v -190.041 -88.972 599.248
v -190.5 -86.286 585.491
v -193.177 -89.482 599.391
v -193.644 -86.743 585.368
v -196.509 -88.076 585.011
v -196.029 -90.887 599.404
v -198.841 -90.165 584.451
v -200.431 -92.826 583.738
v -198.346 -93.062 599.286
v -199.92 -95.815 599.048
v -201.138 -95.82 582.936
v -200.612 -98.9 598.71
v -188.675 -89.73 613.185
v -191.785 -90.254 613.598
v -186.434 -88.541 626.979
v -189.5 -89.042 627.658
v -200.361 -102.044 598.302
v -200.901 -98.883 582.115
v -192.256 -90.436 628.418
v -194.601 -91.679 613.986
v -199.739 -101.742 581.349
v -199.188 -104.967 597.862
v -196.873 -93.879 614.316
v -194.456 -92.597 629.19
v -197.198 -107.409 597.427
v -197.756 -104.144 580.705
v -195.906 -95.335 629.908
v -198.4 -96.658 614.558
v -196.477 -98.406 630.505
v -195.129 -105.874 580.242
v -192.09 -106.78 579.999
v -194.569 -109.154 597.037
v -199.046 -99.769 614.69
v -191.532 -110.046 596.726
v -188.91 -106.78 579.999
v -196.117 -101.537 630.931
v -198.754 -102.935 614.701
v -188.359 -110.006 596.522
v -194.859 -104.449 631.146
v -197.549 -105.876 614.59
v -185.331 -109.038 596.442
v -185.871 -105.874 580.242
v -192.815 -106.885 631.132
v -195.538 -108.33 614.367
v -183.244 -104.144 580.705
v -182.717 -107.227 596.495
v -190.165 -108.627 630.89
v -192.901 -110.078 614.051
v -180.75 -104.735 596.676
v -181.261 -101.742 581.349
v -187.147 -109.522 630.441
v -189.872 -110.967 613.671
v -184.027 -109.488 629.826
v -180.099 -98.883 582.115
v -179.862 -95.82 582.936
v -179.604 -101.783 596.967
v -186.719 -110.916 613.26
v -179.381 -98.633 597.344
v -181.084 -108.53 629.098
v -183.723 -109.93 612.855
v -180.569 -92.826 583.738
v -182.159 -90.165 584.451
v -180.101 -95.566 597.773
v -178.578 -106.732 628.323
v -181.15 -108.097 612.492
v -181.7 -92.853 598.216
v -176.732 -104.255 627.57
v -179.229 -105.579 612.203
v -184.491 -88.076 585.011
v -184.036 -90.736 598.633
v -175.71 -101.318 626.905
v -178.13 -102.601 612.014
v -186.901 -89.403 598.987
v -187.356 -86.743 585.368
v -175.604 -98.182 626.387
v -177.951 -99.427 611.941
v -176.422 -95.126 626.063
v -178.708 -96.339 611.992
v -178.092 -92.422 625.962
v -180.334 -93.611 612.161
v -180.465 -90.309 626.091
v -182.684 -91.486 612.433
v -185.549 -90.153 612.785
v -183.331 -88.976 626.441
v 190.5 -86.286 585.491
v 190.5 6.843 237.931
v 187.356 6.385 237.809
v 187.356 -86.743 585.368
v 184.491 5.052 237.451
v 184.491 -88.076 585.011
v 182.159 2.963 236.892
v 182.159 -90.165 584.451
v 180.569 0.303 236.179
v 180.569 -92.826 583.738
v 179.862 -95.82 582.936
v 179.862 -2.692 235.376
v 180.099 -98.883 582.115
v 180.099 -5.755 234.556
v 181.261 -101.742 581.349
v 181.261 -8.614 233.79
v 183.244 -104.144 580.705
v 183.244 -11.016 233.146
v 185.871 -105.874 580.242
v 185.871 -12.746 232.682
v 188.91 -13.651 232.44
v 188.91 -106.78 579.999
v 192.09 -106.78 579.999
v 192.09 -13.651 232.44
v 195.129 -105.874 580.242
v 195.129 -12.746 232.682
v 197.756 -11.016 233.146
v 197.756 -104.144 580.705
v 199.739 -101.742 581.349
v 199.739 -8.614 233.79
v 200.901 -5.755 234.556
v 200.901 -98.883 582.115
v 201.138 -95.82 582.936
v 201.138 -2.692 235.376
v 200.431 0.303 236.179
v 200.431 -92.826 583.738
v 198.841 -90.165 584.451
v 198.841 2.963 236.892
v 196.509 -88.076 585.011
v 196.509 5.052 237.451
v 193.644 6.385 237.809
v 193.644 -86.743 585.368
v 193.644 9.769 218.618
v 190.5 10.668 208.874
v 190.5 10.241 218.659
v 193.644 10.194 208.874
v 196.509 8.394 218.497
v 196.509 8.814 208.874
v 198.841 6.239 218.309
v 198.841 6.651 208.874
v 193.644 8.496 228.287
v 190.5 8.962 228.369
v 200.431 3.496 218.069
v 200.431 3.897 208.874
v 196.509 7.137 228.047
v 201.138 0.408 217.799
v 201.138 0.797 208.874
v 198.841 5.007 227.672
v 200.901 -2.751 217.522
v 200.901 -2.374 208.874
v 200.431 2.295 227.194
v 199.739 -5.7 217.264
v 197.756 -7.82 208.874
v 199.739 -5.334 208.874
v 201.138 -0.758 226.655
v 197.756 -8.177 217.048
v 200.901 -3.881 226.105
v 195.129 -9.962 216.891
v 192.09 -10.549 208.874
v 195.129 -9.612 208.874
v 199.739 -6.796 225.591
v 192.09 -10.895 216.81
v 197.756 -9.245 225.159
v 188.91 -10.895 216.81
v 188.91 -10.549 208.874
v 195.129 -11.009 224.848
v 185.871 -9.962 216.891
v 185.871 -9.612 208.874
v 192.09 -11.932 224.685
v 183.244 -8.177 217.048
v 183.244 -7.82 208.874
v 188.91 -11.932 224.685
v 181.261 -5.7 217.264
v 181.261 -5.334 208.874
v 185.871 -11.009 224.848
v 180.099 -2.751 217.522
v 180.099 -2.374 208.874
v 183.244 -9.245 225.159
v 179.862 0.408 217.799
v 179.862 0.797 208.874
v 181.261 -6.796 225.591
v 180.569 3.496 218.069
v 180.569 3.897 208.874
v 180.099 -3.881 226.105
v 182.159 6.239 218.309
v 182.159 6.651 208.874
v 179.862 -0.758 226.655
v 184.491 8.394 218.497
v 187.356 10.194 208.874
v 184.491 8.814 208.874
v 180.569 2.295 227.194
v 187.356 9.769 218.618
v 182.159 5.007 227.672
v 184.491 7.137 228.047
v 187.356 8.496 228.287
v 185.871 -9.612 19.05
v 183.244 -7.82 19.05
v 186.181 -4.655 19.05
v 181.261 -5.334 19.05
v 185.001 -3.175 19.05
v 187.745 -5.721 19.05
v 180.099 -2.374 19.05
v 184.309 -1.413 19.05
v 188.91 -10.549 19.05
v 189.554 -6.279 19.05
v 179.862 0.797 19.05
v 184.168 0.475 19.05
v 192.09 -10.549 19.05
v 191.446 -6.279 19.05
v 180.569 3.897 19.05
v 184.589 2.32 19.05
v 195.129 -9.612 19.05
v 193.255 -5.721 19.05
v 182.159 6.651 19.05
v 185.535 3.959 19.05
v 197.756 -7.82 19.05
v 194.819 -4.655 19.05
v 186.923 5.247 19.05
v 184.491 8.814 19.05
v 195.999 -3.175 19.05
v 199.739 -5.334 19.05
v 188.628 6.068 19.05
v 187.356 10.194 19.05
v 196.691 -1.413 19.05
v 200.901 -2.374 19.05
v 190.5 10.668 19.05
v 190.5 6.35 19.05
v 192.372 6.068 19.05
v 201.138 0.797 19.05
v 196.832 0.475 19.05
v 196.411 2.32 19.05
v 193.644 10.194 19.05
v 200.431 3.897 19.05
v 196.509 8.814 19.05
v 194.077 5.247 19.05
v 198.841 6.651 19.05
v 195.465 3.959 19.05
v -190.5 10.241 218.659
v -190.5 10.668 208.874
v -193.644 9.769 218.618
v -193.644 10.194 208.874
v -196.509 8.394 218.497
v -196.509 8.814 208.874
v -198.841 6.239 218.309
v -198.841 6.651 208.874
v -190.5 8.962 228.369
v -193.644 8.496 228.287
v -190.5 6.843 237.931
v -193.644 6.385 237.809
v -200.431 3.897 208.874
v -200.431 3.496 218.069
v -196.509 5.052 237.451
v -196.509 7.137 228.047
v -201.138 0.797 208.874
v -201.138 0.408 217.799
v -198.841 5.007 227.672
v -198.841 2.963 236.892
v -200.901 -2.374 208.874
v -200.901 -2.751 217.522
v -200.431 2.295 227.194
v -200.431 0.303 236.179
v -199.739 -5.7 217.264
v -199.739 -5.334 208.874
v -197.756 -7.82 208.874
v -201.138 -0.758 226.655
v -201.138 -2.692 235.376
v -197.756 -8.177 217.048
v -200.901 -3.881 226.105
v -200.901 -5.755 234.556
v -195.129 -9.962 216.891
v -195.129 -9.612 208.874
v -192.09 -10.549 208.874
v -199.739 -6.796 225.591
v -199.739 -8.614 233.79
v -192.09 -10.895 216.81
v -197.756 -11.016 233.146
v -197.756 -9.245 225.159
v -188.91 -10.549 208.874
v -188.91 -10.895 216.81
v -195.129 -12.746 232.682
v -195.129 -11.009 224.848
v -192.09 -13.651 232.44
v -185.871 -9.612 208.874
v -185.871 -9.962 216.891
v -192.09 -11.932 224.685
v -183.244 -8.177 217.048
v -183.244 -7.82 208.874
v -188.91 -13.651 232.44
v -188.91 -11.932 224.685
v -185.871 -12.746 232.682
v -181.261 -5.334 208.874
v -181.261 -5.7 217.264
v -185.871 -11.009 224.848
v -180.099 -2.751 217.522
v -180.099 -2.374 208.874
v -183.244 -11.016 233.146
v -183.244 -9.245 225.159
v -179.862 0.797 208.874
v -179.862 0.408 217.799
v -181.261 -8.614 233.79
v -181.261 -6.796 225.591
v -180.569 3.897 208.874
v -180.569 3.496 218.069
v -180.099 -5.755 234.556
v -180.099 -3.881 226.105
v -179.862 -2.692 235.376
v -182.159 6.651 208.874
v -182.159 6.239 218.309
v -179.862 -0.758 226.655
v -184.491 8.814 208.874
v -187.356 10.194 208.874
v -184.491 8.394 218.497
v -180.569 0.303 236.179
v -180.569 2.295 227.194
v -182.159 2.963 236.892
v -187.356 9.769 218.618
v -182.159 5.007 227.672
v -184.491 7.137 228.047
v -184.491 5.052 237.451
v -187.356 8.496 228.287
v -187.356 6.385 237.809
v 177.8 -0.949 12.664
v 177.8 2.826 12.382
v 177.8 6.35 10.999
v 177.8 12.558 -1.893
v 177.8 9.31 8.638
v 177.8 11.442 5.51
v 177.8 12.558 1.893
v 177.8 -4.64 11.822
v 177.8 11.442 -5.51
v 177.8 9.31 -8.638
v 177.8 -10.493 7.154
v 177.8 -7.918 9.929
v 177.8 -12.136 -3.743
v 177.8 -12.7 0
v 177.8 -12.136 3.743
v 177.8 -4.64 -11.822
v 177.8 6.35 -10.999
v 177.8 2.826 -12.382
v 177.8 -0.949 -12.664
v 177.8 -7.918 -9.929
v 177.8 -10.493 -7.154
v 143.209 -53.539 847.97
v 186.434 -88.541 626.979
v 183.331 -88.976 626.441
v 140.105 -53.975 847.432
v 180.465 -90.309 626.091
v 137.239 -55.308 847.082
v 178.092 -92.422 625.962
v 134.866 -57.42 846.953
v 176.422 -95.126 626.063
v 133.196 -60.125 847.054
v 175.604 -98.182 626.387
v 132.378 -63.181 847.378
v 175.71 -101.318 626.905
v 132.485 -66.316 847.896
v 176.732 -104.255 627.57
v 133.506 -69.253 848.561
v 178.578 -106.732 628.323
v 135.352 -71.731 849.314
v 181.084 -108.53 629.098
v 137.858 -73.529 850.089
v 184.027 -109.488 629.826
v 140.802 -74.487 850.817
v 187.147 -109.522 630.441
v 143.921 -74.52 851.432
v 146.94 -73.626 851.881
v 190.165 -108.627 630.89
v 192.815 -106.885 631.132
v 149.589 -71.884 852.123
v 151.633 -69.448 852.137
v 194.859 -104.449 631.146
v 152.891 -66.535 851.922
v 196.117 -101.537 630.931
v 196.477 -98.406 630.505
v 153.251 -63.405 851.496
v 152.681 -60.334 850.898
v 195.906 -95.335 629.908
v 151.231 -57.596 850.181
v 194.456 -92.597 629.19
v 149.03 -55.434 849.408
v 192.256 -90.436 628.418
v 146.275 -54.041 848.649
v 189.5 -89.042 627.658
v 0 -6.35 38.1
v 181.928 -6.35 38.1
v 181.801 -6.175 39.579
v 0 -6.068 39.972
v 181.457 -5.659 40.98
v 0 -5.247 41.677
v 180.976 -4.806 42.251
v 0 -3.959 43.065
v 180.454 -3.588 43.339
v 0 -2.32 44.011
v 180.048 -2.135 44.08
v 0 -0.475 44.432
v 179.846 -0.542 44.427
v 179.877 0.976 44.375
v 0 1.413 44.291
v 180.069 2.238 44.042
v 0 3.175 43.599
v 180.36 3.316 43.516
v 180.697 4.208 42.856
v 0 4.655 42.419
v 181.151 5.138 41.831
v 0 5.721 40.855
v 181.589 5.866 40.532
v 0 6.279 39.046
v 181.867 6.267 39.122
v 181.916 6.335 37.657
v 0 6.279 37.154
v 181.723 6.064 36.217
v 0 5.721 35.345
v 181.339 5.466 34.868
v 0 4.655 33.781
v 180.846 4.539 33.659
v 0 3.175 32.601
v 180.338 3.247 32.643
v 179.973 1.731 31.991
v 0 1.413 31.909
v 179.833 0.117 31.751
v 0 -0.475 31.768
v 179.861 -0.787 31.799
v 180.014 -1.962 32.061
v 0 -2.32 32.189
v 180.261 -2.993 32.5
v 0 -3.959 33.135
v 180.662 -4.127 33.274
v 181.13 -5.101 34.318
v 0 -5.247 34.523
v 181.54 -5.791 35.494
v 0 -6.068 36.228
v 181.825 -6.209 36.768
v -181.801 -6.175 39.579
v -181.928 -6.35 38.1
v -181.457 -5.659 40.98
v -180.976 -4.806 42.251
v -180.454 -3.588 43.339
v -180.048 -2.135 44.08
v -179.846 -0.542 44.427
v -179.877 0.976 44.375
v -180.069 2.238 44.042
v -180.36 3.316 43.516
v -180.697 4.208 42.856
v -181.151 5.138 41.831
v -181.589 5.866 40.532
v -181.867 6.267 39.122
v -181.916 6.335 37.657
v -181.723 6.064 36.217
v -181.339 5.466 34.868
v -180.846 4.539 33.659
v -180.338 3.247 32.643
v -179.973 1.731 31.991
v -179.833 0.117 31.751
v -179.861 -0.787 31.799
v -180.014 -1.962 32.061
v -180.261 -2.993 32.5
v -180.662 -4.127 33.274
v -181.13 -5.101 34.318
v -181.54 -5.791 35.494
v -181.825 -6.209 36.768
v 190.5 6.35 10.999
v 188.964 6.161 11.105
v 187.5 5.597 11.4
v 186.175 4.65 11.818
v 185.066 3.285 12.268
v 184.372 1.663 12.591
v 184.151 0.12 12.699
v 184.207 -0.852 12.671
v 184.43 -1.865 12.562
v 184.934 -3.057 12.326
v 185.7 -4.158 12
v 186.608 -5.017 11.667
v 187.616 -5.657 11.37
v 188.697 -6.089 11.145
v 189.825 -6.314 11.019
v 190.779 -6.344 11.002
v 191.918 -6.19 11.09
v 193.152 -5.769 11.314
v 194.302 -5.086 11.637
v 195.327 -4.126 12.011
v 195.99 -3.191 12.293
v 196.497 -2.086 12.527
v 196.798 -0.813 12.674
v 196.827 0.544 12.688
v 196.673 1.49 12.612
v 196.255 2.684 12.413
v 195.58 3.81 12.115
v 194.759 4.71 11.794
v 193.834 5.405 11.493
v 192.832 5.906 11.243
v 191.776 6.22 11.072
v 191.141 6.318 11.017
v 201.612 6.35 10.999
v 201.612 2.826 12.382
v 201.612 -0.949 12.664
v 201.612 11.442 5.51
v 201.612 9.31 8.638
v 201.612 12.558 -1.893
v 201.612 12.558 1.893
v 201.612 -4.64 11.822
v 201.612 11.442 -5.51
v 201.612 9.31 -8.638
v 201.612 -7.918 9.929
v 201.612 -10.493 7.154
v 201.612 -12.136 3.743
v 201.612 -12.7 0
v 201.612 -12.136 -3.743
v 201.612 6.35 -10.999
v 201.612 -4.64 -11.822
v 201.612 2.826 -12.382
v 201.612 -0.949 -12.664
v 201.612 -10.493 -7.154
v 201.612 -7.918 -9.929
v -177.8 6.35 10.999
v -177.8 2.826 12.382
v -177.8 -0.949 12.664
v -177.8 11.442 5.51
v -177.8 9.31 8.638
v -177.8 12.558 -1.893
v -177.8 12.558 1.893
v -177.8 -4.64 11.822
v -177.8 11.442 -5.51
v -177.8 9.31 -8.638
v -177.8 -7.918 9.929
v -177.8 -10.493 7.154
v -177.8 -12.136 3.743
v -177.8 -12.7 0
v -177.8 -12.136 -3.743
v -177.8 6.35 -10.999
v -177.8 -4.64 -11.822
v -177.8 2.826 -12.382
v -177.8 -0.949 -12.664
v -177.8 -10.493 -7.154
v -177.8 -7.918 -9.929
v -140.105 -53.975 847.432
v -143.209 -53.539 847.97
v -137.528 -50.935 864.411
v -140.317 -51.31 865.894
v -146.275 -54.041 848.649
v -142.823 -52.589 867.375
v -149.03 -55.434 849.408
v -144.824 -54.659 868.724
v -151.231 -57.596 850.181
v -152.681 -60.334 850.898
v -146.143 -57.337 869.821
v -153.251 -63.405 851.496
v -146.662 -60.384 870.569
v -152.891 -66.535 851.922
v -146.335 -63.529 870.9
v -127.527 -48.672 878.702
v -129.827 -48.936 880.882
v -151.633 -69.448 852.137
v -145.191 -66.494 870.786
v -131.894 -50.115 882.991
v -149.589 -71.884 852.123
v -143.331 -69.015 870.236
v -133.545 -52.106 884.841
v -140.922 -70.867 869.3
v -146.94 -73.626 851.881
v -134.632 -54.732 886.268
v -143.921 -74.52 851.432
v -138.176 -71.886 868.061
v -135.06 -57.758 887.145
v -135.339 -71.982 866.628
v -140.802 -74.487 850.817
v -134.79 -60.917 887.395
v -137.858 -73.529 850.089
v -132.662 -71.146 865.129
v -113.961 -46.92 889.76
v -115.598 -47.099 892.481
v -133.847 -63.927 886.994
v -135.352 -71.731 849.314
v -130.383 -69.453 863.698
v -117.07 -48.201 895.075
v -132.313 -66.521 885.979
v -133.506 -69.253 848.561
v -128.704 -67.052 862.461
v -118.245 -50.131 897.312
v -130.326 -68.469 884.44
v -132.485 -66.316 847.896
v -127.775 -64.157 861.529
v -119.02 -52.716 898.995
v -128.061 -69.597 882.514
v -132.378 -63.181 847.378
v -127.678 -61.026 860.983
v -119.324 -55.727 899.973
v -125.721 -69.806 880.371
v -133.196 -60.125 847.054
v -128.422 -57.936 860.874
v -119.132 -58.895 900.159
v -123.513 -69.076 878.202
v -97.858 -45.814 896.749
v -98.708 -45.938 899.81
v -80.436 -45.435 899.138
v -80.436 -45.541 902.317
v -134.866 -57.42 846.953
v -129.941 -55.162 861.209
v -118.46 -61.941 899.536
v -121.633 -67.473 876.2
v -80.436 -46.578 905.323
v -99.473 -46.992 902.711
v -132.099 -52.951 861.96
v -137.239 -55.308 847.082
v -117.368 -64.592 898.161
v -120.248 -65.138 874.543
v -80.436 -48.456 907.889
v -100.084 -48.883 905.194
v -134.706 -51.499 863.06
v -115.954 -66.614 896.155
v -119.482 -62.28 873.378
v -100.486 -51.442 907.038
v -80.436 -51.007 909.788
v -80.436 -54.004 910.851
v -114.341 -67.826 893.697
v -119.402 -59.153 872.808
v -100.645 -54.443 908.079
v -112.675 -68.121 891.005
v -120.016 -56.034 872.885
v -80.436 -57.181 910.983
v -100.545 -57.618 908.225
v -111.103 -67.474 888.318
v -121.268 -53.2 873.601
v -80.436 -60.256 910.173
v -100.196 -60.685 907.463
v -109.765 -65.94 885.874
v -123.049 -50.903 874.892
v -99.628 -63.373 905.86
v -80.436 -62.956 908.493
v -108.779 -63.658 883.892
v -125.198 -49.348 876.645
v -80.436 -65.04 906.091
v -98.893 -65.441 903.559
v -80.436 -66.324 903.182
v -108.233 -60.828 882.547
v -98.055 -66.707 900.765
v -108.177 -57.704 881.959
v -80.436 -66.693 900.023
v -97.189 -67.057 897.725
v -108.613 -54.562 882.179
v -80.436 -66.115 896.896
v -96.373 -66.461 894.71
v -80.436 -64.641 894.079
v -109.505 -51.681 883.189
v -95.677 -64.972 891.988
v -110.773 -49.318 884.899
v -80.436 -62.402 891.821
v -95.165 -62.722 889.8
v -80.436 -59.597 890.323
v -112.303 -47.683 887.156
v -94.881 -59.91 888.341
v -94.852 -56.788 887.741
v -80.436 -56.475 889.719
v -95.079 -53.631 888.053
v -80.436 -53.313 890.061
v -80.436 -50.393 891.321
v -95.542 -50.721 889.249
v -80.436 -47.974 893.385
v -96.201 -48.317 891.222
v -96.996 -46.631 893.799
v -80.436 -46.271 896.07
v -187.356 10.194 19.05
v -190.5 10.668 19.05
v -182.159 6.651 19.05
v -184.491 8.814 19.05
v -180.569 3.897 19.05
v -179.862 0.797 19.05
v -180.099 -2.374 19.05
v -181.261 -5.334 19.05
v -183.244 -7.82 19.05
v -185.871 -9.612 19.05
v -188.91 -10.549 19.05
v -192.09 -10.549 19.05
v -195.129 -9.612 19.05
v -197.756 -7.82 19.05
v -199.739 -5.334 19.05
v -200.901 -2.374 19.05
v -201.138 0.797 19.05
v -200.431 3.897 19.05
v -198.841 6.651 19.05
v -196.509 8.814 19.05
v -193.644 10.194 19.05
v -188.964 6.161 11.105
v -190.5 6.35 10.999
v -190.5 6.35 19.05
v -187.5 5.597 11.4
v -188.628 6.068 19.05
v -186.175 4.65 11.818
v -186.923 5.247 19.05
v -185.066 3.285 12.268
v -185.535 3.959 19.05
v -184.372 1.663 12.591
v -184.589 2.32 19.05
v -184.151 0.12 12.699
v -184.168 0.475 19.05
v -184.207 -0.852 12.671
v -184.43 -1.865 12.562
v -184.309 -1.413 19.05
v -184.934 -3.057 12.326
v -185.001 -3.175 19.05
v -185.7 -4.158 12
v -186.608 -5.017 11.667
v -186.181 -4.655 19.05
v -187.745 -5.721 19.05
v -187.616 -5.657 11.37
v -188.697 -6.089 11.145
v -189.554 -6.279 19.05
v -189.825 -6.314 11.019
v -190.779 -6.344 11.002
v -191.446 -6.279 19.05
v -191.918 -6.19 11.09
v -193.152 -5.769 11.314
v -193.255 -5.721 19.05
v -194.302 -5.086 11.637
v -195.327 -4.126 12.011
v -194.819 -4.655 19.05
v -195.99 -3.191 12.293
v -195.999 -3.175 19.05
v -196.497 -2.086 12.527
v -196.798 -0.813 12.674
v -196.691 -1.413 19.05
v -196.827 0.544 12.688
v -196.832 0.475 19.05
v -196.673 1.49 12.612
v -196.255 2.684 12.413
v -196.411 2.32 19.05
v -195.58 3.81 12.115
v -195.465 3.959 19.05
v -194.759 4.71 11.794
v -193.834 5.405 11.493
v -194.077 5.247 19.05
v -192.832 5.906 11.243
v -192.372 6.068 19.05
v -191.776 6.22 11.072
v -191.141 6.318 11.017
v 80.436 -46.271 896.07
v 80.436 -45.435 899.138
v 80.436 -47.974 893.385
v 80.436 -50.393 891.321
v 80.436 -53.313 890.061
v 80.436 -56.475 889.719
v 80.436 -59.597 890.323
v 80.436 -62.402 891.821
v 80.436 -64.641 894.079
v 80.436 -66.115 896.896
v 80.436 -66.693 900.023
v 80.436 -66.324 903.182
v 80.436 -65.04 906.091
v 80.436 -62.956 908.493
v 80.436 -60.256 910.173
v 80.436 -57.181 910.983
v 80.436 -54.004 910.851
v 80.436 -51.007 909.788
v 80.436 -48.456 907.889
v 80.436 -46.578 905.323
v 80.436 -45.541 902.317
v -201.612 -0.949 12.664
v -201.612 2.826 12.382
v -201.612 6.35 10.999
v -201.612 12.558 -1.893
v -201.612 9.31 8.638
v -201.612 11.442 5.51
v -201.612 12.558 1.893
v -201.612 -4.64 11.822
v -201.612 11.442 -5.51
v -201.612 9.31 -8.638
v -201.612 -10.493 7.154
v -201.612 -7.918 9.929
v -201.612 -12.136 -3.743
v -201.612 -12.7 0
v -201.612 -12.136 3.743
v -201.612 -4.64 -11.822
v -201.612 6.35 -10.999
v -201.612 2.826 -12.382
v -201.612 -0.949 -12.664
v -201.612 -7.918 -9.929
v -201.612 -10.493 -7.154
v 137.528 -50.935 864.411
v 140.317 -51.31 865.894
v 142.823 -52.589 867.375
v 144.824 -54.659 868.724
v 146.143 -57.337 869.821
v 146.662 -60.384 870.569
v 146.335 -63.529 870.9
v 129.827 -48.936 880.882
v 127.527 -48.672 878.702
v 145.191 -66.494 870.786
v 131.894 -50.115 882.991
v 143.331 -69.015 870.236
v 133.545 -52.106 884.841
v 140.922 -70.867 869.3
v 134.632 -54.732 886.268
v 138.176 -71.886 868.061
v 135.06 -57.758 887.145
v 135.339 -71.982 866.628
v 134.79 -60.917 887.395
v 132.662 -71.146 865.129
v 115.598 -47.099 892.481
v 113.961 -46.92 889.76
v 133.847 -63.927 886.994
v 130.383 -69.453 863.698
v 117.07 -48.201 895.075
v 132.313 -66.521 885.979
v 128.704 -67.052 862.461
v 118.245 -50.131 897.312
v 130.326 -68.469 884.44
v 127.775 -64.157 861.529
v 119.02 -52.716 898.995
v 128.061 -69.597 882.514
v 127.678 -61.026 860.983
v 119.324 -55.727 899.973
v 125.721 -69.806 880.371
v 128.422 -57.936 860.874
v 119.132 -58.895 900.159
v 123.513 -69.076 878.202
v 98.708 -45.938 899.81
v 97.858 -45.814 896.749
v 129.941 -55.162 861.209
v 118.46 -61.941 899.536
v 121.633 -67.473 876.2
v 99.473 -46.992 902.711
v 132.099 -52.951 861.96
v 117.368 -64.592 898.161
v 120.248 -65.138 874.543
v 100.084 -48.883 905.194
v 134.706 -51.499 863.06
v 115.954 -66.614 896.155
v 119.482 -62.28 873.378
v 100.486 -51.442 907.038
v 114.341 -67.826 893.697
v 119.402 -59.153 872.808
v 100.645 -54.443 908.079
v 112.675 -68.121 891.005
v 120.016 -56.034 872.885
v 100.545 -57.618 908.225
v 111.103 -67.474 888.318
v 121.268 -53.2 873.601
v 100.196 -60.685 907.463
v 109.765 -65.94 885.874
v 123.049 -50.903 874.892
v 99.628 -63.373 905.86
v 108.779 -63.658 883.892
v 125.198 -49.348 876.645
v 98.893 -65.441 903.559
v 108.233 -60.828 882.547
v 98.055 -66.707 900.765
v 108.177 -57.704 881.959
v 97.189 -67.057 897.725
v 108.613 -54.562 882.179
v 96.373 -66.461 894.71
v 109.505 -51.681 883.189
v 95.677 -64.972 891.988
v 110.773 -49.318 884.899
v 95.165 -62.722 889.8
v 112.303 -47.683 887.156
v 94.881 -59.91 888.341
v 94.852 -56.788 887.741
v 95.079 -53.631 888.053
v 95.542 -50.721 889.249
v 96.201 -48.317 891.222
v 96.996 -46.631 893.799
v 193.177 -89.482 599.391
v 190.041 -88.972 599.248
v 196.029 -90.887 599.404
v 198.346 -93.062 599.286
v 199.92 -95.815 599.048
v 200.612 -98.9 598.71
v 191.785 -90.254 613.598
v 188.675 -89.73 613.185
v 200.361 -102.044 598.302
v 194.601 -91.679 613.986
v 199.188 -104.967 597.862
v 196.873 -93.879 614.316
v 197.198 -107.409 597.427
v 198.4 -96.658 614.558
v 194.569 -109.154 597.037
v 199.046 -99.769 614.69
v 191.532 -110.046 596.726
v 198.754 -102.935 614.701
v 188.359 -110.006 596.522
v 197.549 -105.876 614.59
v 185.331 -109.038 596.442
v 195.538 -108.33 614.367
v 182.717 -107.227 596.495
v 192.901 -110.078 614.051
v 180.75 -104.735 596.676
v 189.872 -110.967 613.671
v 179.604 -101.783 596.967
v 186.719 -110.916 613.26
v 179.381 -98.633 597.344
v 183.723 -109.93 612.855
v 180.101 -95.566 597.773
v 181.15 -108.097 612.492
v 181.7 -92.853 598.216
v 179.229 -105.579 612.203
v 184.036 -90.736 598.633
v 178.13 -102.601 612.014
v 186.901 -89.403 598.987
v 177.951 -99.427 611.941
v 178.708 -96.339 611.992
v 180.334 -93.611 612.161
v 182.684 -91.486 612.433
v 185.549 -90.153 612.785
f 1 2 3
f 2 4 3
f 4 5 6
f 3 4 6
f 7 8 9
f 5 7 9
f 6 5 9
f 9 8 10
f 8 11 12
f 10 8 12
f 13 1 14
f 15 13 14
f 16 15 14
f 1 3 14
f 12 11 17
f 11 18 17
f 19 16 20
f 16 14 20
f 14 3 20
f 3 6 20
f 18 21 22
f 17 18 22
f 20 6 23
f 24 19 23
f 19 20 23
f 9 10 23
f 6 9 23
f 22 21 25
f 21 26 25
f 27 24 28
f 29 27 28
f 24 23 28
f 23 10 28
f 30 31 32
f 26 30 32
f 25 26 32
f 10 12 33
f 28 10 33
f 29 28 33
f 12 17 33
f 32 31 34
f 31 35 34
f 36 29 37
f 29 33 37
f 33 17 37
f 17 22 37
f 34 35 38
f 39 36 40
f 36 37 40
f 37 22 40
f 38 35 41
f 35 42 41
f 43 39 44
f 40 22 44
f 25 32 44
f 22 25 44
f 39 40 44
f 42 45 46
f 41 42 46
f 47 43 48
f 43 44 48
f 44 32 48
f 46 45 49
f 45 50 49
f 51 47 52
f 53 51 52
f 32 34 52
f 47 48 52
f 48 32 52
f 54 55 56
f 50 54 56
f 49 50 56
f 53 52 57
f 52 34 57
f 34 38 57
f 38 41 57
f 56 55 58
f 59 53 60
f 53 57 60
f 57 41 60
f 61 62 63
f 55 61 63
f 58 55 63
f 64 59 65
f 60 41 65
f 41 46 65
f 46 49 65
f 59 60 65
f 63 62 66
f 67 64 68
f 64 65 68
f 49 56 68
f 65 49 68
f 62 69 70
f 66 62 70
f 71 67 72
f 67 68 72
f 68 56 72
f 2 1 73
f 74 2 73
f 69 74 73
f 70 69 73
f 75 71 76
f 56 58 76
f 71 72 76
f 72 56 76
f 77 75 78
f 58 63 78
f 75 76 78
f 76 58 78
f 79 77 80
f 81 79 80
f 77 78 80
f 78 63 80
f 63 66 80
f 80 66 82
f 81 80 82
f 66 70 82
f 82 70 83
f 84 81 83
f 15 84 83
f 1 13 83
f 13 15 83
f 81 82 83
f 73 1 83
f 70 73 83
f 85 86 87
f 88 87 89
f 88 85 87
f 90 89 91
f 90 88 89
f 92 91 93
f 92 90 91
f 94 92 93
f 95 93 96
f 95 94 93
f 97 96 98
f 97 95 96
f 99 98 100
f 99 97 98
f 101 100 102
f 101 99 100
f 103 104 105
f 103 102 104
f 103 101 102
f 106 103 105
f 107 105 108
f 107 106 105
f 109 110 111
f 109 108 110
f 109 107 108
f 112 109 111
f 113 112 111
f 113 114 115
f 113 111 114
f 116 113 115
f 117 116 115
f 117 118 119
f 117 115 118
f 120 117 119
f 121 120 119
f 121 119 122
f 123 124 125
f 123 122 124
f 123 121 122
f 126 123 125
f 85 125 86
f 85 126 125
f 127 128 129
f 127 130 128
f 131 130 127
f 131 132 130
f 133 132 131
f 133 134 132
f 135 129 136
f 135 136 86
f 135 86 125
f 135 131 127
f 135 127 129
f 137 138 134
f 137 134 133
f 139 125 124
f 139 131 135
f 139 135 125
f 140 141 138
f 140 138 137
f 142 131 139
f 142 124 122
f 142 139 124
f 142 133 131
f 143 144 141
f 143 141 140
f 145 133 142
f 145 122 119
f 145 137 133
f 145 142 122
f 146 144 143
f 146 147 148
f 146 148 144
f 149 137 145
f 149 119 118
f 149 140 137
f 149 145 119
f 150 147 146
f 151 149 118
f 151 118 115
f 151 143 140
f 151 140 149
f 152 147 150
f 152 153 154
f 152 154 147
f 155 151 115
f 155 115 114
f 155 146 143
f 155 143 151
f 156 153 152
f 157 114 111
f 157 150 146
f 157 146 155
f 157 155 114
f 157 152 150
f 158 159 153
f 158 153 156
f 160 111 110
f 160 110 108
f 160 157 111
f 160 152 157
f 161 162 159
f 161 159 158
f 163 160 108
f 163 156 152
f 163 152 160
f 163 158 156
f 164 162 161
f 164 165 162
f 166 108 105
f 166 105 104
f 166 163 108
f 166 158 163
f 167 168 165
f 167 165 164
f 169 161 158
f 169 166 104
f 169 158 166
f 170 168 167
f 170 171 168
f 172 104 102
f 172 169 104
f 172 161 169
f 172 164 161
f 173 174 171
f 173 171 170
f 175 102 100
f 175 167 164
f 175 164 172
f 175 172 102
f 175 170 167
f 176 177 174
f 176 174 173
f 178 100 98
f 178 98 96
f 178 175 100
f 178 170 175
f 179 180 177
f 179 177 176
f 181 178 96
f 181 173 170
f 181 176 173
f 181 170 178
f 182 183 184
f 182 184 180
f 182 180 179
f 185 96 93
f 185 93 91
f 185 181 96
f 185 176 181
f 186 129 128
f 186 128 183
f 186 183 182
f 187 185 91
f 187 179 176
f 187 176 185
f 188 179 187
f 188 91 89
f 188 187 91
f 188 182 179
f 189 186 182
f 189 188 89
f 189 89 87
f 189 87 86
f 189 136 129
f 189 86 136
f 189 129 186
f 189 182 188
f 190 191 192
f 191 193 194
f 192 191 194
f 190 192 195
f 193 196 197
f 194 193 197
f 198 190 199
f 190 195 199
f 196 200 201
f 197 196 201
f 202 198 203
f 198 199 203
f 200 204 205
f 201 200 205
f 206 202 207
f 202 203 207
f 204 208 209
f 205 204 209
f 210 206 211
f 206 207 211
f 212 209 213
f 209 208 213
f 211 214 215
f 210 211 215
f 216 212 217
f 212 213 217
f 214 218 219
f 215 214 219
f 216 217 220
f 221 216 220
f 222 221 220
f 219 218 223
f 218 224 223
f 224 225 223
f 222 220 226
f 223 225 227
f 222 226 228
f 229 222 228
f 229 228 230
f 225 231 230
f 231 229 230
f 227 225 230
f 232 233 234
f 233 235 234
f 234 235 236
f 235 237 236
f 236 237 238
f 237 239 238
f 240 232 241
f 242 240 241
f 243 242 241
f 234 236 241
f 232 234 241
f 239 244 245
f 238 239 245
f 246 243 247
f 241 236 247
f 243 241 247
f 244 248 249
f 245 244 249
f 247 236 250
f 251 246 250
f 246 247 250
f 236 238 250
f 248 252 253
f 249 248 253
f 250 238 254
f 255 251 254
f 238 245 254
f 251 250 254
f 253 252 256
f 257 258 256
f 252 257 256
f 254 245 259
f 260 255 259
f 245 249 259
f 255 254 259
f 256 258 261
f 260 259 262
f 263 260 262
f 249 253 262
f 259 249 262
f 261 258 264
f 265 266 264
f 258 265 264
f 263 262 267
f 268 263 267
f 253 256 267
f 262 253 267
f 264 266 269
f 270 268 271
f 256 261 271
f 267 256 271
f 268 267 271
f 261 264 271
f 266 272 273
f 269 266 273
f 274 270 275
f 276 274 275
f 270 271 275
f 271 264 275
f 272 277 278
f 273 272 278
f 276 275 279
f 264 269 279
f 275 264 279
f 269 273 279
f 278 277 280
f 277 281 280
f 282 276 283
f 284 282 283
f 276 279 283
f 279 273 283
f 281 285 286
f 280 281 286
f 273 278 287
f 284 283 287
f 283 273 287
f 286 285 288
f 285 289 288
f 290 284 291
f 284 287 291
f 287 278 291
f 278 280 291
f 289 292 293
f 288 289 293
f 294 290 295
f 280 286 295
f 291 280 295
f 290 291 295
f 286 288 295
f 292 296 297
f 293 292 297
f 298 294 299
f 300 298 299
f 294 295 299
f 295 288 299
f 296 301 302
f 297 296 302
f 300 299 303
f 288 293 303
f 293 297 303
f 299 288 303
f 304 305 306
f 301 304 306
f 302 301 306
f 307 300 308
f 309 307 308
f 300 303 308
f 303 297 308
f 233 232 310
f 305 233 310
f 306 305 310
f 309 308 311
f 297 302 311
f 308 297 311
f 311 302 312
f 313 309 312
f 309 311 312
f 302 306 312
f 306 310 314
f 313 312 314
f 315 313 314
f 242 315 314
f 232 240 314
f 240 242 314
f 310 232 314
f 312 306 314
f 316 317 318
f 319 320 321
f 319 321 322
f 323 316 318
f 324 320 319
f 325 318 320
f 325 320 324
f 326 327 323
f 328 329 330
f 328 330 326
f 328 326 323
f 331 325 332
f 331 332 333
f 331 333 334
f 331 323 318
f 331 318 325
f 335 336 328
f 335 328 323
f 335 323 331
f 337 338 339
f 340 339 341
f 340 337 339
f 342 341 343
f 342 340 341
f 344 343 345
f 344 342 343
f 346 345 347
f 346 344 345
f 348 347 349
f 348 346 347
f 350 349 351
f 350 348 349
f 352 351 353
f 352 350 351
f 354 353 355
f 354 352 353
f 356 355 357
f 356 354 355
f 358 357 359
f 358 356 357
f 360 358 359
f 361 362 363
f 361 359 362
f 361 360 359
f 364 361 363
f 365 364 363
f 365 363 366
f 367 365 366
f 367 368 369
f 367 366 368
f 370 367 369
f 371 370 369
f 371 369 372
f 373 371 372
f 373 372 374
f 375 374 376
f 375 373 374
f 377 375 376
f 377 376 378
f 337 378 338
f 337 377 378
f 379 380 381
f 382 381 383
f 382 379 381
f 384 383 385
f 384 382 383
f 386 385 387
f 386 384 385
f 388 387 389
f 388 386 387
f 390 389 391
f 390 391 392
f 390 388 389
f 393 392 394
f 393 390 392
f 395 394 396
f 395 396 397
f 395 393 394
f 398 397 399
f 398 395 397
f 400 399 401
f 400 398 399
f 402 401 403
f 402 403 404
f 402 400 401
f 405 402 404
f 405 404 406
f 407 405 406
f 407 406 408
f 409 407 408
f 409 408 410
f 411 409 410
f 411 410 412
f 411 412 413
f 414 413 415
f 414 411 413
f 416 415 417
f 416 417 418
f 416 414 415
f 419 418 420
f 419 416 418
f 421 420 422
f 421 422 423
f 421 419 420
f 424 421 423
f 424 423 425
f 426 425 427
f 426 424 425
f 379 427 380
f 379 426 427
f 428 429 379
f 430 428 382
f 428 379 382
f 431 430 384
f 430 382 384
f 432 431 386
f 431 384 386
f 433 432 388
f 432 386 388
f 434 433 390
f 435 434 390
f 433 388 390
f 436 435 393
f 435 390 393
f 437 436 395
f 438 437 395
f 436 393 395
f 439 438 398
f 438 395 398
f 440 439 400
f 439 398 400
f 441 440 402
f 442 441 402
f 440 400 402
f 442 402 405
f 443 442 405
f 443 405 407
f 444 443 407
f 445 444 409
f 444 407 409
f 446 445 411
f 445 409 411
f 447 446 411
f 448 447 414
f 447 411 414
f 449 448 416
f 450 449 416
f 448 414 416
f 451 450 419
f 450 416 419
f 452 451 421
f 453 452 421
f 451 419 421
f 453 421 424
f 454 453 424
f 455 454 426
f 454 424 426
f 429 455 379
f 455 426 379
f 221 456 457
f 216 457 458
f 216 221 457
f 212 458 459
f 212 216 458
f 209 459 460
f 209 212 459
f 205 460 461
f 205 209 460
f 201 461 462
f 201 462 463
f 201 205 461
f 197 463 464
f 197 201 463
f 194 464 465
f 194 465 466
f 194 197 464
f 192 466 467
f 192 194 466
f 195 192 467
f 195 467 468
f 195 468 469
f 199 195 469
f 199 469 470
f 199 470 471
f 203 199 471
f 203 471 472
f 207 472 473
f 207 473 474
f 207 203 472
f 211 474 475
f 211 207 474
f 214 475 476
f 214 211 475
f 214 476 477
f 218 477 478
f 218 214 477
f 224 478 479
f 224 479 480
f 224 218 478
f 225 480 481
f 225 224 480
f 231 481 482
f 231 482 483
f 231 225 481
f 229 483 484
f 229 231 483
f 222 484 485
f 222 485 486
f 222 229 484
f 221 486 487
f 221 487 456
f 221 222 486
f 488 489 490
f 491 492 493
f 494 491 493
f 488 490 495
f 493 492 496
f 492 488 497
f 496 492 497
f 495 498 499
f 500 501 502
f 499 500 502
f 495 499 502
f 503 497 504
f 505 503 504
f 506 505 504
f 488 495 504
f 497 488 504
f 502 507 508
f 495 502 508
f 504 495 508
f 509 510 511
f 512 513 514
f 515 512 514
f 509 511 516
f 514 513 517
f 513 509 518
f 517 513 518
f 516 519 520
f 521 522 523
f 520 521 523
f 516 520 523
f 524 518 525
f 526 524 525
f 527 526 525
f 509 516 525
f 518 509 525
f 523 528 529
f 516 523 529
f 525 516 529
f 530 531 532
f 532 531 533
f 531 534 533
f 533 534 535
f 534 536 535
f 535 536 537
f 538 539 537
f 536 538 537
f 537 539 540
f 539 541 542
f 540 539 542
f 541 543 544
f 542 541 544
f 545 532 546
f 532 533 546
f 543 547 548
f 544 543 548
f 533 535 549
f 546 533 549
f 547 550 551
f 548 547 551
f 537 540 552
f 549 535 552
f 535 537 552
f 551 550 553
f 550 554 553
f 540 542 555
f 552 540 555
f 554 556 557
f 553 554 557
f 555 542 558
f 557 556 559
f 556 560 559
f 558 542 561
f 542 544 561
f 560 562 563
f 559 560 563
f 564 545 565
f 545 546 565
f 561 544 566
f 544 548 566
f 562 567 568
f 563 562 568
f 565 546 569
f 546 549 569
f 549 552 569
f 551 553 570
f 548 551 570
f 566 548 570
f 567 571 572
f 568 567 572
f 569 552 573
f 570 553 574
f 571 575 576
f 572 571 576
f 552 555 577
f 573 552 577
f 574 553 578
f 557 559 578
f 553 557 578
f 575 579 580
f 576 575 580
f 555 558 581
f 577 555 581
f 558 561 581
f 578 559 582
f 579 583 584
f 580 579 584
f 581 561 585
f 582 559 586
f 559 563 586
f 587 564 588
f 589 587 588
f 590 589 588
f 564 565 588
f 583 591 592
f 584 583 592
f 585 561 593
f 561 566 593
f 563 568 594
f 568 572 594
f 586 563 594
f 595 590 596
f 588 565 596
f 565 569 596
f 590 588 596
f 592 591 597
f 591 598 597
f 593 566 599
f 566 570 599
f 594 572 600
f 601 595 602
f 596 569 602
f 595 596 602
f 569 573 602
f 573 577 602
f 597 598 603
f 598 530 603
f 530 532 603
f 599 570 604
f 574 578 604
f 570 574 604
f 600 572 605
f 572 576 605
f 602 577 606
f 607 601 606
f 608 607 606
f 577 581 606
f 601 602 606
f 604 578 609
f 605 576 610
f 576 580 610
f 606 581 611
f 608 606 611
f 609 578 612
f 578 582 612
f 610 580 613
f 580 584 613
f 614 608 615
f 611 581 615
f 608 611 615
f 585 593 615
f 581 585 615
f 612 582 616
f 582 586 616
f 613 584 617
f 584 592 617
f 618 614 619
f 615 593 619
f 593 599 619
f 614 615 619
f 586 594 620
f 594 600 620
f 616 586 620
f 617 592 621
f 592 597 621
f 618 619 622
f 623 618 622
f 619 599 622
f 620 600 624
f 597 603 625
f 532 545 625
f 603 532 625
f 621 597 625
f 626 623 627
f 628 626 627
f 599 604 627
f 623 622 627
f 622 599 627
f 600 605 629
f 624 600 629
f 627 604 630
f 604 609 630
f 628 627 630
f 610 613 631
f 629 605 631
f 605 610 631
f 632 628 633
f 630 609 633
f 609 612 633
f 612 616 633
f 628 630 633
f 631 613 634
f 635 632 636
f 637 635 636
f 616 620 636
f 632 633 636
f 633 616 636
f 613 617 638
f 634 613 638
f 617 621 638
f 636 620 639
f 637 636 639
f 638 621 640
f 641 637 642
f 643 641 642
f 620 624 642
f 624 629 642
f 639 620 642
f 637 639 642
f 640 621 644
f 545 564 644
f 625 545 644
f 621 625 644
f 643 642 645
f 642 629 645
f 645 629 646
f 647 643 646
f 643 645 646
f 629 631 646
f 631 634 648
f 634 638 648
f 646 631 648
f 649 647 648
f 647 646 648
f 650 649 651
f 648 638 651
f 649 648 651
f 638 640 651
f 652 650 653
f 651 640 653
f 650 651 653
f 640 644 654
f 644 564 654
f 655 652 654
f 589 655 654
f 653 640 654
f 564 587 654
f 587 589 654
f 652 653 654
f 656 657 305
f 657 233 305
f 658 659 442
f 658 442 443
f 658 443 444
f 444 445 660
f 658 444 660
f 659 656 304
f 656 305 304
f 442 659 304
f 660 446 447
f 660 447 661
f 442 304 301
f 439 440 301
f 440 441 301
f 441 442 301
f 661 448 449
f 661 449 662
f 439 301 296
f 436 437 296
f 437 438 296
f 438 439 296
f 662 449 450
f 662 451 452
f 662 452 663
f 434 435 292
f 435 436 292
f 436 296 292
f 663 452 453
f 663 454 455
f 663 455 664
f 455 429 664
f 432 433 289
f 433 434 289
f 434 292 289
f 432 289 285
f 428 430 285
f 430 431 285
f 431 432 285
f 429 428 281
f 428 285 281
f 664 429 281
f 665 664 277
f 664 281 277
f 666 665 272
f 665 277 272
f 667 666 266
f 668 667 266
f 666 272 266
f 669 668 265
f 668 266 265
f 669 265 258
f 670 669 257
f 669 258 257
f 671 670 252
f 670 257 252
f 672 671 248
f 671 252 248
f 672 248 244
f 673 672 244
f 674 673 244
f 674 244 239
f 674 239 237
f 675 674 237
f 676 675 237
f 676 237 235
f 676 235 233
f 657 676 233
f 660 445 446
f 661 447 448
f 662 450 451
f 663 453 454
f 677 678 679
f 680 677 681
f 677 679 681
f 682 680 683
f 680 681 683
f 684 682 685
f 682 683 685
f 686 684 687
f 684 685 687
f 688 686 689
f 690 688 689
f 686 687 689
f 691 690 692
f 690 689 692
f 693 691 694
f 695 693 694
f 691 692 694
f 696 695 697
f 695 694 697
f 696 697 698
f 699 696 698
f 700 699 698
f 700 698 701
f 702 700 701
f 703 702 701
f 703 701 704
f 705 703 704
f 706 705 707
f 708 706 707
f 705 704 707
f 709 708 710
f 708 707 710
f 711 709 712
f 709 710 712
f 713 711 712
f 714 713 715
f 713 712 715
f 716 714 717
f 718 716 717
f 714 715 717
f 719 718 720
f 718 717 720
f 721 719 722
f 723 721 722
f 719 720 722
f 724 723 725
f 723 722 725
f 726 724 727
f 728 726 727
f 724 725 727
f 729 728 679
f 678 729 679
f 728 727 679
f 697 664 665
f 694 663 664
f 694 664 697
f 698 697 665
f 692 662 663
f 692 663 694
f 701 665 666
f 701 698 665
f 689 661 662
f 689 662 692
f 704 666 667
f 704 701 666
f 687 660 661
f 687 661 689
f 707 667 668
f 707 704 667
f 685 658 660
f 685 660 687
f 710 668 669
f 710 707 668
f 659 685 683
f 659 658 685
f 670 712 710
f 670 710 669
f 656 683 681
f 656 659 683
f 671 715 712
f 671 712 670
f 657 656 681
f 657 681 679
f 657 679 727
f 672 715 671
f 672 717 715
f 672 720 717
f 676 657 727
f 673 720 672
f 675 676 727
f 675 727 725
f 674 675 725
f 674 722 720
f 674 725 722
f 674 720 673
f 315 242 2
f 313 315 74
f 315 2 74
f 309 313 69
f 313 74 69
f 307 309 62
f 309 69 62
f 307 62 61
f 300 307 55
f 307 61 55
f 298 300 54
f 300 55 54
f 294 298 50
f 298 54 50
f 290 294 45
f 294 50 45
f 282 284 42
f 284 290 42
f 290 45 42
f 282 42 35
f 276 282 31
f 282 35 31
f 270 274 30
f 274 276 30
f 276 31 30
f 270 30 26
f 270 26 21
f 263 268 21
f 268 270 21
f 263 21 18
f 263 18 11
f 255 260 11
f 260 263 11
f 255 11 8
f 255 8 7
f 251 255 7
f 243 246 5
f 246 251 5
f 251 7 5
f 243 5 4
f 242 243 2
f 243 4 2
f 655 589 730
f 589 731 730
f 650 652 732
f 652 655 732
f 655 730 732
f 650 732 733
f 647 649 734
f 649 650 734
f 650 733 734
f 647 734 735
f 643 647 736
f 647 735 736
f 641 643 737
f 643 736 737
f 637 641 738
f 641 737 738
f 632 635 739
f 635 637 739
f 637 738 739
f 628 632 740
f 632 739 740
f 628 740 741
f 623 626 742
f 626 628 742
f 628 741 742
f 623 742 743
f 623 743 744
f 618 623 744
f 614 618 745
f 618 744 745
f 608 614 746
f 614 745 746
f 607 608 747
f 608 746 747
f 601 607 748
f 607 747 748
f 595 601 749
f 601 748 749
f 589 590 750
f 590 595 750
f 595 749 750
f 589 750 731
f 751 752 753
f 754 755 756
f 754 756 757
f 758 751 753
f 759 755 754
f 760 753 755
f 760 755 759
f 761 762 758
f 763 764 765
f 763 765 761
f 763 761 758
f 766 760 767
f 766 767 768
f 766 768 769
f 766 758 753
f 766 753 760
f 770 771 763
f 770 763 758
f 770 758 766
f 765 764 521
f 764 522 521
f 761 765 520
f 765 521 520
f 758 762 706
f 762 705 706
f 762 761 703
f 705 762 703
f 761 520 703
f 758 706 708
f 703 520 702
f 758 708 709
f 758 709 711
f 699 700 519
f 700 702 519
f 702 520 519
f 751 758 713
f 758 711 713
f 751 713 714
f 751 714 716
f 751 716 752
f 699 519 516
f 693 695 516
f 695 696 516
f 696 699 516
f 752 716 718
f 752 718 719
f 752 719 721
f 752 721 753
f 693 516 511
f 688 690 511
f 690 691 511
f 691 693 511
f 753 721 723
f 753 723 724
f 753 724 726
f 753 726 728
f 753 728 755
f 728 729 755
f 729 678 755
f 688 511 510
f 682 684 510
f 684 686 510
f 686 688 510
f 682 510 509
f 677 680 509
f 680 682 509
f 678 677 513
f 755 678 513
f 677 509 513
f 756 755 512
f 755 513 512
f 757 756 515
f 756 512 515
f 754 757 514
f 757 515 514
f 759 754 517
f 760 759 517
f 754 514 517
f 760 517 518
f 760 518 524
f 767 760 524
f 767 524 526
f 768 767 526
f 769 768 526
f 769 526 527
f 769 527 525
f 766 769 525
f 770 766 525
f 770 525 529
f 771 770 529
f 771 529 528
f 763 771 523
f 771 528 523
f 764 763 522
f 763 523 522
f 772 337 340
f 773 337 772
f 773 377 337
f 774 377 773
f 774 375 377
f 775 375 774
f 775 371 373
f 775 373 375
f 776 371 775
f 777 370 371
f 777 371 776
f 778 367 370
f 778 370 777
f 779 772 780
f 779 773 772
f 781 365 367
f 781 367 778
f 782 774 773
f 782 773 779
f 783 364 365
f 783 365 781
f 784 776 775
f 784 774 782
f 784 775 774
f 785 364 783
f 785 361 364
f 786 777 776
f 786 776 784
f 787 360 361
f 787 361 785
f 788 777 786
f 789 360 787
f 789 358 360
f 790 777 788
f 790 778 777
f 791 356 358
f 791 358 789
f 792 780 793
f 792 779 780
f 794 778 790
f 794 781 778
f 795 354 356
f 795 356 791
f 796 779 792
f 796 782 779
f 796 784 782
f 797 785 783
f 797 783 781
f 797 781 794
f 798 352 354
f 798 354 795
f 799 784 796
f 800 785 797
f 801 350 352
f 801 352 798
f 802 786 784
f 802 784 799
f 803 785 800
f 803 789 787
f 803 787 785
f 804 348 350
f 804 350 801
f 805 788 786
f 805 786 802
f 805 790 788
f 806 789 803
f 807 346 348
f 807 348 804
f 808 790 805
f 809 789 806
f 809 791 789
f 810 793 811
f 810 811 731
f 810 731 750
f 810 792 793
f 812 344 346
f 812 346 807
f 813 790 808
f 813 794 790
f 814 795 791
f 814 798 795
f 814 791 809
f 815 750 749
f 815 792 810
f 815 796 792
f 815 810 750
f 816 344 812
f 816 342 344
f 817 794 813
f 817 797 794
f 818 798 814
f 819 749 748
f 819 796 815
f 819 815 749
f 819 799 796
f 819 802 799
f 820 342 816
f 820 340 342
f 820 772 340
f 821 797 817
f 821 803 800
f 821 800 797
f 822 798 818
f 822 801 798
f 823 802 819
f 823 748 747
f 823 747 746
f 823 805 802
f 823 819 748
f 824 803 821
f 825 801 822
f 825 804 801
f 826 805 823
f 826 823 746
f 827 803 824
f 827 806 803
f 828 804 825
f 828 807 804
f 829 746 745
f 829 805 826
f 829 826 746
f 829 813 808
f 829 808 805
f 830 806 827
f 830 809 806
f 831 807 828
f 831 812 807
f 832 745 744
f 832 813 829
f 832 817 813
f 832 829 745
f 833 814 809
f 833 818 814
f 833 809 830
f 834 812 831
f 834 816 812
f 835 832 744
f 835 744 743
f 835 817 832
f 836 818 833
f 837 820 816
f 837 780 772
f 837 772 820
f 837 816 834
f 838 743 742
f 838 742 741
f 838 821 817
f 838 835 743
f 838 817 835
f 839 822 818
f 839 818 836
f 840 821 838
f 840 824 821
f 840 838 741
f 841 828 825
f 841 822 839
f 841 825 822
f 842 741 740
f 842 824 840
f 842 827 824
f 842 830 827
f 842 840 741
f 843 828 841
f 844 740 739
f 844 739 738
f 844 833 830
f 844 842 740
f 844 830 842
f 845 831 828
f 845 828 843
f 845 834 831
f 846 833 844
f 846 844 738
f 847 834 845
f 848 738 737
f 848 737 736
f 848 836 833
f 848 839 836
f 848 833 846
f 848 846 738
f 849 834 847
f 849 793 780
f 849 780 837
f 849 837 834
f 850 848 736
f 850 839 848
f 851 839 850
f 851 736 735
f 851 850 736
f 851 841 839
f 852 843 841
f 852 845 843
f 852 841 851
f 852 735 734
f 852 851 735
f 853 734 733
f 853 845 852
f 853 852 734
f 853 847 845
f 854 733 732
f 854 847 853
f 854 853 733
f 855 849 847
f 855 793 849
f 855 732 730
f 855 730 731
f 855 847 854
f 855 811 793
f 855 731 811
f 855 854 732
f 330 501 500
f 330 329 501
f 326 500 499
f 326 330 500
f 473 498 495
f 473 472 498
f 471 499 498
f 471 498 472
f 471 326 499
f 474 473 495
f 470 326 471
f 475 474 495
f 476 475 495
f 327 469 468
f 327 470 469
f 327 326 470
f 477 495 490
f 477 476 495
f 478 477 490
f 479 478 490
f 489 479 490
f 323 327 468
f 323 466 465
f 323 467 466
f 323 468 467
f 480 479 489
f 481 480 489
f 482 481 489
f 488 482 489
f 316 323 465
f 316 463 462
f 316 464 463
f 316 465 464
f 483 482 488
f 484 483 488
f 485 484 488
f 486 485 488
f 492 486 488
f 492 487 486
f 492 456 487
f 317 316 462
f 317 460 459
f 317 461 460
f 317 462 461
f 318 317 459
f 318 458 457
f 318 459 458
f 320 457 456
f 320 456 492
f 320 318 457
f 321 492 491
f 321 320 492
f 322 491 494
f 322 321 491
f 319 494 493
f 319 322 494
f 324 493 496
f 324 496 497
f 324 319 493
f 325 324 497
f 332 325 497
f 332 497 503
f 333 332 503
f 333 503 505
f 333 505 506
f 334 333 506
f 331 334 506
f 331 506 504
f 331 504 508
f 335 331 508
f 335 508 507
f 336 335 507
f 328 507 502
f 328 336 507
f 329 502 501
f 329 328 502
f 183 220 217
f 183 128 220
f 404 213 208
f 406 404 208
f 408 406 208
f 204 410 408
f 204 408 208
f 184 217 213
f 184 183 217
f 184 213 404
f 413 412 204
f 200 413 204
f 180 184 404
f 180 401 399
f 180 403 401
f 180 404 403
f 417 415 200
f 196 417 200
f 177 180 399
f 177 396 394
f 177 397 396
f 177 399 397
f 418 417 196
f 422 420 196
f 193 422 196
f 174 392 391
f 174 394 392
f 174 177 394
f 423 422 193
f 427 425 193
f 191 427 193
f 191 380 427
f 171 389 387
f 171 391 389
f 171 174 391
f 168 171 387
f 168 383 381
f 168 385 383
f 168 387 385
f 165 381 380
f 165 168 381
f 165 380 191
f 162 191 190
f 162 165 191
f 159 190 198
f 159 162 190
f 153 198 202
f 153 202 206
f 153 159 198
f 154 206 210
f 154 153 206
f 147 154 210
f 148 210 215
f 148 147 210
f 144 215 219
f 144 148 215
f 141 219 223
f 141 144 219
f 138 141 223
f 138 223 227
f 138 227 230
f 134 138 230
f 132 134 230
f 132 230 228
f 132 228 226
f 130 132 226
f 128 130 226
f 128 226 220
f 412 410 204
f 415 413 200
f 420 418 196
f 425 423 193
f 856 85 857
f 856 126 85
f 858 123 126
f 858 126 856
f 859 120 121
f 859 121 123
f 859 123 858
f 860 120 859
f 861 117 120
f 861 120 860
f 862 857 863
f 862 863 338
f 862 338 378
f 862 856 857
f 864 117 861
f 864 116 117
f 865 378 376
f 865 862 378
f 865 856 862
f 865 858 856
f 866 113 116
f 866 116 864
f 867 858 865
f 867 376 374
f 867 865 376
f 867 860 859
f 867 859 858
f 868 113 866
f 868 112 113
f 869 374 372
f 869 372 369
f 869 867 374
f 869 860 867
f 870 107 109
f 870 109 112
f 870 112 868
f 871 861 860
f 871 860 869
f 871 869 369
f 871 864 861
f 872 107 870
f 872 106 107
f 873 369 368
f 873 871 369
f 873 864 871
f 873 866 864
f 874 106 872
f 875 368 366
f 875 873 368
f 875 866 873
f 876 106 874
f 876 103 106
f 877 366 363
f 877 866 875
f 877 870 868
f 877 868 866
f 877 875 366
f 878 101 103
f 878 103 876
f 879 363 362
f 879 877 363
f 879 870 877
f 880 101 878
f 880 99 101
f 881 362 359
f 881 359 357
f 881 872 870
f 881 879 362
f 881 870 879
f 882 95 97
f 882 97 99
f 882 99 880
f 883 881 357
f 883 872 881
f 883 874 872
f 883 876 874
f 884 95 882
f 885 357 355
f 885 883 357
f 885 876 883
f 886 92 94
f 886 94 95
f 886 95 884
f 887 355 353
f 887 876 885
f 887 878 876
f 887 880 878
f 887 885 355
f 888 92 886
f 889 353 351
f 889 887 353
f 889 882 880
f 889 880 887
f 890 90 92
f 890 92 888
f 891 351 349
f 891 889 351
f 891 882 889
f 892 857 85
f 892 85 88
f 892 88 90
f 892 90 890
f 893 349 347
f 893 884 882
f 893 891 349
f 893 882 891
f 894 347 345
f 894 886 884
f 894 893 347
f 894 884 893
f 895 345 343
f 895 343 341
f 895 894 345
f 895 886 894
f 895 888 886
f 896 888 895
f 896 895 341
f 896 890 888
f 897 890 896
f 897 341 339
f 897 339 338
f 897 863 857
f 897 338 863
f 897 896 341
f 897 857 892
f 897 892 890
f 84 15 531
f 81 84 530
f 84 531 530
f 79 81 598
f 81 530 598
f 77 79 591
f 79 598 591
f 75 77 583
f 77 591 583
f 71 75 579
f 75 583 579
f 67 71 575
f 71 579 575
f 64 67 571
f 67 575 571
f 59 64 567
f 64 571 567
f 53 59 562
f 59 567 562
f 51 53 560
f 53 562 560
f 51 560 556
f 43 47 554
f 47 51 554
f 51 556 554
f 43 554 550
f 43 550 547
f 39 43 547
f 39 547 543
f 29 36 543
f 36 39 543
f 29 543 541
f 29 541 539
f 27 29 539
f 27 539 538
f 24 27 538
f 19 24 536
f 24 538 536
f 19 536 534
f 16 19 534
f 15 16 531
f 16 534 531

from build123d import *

# Parameters (mm, degrees)
MAIN_FRAME_PROFILE_R        = 10.668
CROSS_BAR_BOTTOM_PROFILE_R  = 6.35
SWIVEL_CONNECTION_PROFILE_R = 6.35
SWIVEL_OUTER_PROFILE_R      = 12.7


with BuildPart() as part:
    # Main Frame: sweep along a curve in space
    with BuildLine() as main_frame_path:
        Line((190.5, 0, 19.05), (190.5, 0, 208.874106245))
        ThreePointArc((190.5, 0, 208.874106245), (190.5, -0.869202084, 222.135567375), (190.5, -3.461936049, 235.170121228))
        Line((190.5, -3.461936049, 235.170121228), (190.5, -96.590179262, 582.729456518))
        ThreePointArc((186.008430573, -99.081814666, 628.564887795), (189.362259809, -100.245120407, 605.624792126), (190.5, -96.590179262, 582.729456518))
        Line((142.782679241, -64.080286866, 849.555836961), (186.008430573, -99.081814666, 628.564887795))
        ThreePointArc((80.435511173, -56.030942434, 900.377397559), (120.854542376, -58.303150976, 886.031237436), (142.782679241, -64.080286866, 849.555836961))
        Line((0, -56.030942434, 900.377397559), (80.435511173, -56.030942434, 900.377397559))
    # Main Frame profile (on start of the path) → Main Frame (sweep)
    with BuildSketch(Plane(origin=(190.5, 0, 19.05), x_dir=(0, 1, 0), z_dir=(0, 0, 1))):
        Circle(MAIN_FRAME_PROFILE_R)
    main_frame = sweep(path=main_frame_path.line)

    # Cross Bar Bottom: sweep along a curve in space
    with BuildLine() as cross_bar_bottom_path:
        Line((190.5, 0, 38.1), (0, 0, 38.1))
    # Cross Bar Bottom profile (on start of the path) → Cross Bar Bottom (sweep)
    with BuildSketch(Plane(origin=(190.5, 0, 38.1), x_dir=(0, -1, 0), z_dir=(-1, 0, 0))):
        Circle(CROSS_BAR_BOTTOM_PROFILE_R)
    cross_bar_bottom = sweep(path=cross_bar_bottom_path.line)

    # Swivel Connection: sweep along a curve in space
    with BuildLine() as swivel_connection_path:
        Line((190.5, 0, 0), (190.5, 0, 19.05))
    # Swivel Connection profile (on start of the path) → Swivel Connection (sweep)
    with BuildSketch(Plane(origin=(190.5, 0, 0), x_dir=(0, 1, 0), z_dir=(0, 0, 1))):
        Circle(SWIVEL_CONNECTION_PROFILE_R)
    swivel_connection = sweep(path=swivel_connection_path.line)

    # Swivel Outer: sweep along a curve in space
    with BuildLine() as swivel_outer_path:
        Line((201.6125, 0, 0), (177.8, 0, 0))
    # Swivel Outer profile (on start of the path) → Swivel Outer (sweep)
    with BuildSketch(Plane(origin=(201.6125, 0, 0), x_dir=(0, -1, 0), z_dir=(-1, 0, 0))):
        Circle(SWIVEL_OUTER_PROFILE_R)
    swivel_outer = sweep(path=swivel_outer_path.line)

    # Mirror1: Main Frame, Cross Bar Bottom, Swivel Connection, Swivel Outer across plane
    add(main_frame.mirror(Plane(origin=(0, 0, 0), x_dir=(0, 0, 1), z_dir=(1, 0, 0))))
    add(cross_bar_bottom.mirror(Plane(origin=(0, 0, 0), x_dir=(0, 0, 1), z_dir=(1, 0, 0))))
    add(swivel_connection.mirror(Plane(origin=(0, 0, 0), x_dir=(0, 0, 1), z_dir=(1, 0, 0))))
    add(swivel_outer.mirror(Plane(origin=(0, 0, 0), x_dir=(0, 0, 1), z_dir=(1, 0, 0))))


solid = part.part
